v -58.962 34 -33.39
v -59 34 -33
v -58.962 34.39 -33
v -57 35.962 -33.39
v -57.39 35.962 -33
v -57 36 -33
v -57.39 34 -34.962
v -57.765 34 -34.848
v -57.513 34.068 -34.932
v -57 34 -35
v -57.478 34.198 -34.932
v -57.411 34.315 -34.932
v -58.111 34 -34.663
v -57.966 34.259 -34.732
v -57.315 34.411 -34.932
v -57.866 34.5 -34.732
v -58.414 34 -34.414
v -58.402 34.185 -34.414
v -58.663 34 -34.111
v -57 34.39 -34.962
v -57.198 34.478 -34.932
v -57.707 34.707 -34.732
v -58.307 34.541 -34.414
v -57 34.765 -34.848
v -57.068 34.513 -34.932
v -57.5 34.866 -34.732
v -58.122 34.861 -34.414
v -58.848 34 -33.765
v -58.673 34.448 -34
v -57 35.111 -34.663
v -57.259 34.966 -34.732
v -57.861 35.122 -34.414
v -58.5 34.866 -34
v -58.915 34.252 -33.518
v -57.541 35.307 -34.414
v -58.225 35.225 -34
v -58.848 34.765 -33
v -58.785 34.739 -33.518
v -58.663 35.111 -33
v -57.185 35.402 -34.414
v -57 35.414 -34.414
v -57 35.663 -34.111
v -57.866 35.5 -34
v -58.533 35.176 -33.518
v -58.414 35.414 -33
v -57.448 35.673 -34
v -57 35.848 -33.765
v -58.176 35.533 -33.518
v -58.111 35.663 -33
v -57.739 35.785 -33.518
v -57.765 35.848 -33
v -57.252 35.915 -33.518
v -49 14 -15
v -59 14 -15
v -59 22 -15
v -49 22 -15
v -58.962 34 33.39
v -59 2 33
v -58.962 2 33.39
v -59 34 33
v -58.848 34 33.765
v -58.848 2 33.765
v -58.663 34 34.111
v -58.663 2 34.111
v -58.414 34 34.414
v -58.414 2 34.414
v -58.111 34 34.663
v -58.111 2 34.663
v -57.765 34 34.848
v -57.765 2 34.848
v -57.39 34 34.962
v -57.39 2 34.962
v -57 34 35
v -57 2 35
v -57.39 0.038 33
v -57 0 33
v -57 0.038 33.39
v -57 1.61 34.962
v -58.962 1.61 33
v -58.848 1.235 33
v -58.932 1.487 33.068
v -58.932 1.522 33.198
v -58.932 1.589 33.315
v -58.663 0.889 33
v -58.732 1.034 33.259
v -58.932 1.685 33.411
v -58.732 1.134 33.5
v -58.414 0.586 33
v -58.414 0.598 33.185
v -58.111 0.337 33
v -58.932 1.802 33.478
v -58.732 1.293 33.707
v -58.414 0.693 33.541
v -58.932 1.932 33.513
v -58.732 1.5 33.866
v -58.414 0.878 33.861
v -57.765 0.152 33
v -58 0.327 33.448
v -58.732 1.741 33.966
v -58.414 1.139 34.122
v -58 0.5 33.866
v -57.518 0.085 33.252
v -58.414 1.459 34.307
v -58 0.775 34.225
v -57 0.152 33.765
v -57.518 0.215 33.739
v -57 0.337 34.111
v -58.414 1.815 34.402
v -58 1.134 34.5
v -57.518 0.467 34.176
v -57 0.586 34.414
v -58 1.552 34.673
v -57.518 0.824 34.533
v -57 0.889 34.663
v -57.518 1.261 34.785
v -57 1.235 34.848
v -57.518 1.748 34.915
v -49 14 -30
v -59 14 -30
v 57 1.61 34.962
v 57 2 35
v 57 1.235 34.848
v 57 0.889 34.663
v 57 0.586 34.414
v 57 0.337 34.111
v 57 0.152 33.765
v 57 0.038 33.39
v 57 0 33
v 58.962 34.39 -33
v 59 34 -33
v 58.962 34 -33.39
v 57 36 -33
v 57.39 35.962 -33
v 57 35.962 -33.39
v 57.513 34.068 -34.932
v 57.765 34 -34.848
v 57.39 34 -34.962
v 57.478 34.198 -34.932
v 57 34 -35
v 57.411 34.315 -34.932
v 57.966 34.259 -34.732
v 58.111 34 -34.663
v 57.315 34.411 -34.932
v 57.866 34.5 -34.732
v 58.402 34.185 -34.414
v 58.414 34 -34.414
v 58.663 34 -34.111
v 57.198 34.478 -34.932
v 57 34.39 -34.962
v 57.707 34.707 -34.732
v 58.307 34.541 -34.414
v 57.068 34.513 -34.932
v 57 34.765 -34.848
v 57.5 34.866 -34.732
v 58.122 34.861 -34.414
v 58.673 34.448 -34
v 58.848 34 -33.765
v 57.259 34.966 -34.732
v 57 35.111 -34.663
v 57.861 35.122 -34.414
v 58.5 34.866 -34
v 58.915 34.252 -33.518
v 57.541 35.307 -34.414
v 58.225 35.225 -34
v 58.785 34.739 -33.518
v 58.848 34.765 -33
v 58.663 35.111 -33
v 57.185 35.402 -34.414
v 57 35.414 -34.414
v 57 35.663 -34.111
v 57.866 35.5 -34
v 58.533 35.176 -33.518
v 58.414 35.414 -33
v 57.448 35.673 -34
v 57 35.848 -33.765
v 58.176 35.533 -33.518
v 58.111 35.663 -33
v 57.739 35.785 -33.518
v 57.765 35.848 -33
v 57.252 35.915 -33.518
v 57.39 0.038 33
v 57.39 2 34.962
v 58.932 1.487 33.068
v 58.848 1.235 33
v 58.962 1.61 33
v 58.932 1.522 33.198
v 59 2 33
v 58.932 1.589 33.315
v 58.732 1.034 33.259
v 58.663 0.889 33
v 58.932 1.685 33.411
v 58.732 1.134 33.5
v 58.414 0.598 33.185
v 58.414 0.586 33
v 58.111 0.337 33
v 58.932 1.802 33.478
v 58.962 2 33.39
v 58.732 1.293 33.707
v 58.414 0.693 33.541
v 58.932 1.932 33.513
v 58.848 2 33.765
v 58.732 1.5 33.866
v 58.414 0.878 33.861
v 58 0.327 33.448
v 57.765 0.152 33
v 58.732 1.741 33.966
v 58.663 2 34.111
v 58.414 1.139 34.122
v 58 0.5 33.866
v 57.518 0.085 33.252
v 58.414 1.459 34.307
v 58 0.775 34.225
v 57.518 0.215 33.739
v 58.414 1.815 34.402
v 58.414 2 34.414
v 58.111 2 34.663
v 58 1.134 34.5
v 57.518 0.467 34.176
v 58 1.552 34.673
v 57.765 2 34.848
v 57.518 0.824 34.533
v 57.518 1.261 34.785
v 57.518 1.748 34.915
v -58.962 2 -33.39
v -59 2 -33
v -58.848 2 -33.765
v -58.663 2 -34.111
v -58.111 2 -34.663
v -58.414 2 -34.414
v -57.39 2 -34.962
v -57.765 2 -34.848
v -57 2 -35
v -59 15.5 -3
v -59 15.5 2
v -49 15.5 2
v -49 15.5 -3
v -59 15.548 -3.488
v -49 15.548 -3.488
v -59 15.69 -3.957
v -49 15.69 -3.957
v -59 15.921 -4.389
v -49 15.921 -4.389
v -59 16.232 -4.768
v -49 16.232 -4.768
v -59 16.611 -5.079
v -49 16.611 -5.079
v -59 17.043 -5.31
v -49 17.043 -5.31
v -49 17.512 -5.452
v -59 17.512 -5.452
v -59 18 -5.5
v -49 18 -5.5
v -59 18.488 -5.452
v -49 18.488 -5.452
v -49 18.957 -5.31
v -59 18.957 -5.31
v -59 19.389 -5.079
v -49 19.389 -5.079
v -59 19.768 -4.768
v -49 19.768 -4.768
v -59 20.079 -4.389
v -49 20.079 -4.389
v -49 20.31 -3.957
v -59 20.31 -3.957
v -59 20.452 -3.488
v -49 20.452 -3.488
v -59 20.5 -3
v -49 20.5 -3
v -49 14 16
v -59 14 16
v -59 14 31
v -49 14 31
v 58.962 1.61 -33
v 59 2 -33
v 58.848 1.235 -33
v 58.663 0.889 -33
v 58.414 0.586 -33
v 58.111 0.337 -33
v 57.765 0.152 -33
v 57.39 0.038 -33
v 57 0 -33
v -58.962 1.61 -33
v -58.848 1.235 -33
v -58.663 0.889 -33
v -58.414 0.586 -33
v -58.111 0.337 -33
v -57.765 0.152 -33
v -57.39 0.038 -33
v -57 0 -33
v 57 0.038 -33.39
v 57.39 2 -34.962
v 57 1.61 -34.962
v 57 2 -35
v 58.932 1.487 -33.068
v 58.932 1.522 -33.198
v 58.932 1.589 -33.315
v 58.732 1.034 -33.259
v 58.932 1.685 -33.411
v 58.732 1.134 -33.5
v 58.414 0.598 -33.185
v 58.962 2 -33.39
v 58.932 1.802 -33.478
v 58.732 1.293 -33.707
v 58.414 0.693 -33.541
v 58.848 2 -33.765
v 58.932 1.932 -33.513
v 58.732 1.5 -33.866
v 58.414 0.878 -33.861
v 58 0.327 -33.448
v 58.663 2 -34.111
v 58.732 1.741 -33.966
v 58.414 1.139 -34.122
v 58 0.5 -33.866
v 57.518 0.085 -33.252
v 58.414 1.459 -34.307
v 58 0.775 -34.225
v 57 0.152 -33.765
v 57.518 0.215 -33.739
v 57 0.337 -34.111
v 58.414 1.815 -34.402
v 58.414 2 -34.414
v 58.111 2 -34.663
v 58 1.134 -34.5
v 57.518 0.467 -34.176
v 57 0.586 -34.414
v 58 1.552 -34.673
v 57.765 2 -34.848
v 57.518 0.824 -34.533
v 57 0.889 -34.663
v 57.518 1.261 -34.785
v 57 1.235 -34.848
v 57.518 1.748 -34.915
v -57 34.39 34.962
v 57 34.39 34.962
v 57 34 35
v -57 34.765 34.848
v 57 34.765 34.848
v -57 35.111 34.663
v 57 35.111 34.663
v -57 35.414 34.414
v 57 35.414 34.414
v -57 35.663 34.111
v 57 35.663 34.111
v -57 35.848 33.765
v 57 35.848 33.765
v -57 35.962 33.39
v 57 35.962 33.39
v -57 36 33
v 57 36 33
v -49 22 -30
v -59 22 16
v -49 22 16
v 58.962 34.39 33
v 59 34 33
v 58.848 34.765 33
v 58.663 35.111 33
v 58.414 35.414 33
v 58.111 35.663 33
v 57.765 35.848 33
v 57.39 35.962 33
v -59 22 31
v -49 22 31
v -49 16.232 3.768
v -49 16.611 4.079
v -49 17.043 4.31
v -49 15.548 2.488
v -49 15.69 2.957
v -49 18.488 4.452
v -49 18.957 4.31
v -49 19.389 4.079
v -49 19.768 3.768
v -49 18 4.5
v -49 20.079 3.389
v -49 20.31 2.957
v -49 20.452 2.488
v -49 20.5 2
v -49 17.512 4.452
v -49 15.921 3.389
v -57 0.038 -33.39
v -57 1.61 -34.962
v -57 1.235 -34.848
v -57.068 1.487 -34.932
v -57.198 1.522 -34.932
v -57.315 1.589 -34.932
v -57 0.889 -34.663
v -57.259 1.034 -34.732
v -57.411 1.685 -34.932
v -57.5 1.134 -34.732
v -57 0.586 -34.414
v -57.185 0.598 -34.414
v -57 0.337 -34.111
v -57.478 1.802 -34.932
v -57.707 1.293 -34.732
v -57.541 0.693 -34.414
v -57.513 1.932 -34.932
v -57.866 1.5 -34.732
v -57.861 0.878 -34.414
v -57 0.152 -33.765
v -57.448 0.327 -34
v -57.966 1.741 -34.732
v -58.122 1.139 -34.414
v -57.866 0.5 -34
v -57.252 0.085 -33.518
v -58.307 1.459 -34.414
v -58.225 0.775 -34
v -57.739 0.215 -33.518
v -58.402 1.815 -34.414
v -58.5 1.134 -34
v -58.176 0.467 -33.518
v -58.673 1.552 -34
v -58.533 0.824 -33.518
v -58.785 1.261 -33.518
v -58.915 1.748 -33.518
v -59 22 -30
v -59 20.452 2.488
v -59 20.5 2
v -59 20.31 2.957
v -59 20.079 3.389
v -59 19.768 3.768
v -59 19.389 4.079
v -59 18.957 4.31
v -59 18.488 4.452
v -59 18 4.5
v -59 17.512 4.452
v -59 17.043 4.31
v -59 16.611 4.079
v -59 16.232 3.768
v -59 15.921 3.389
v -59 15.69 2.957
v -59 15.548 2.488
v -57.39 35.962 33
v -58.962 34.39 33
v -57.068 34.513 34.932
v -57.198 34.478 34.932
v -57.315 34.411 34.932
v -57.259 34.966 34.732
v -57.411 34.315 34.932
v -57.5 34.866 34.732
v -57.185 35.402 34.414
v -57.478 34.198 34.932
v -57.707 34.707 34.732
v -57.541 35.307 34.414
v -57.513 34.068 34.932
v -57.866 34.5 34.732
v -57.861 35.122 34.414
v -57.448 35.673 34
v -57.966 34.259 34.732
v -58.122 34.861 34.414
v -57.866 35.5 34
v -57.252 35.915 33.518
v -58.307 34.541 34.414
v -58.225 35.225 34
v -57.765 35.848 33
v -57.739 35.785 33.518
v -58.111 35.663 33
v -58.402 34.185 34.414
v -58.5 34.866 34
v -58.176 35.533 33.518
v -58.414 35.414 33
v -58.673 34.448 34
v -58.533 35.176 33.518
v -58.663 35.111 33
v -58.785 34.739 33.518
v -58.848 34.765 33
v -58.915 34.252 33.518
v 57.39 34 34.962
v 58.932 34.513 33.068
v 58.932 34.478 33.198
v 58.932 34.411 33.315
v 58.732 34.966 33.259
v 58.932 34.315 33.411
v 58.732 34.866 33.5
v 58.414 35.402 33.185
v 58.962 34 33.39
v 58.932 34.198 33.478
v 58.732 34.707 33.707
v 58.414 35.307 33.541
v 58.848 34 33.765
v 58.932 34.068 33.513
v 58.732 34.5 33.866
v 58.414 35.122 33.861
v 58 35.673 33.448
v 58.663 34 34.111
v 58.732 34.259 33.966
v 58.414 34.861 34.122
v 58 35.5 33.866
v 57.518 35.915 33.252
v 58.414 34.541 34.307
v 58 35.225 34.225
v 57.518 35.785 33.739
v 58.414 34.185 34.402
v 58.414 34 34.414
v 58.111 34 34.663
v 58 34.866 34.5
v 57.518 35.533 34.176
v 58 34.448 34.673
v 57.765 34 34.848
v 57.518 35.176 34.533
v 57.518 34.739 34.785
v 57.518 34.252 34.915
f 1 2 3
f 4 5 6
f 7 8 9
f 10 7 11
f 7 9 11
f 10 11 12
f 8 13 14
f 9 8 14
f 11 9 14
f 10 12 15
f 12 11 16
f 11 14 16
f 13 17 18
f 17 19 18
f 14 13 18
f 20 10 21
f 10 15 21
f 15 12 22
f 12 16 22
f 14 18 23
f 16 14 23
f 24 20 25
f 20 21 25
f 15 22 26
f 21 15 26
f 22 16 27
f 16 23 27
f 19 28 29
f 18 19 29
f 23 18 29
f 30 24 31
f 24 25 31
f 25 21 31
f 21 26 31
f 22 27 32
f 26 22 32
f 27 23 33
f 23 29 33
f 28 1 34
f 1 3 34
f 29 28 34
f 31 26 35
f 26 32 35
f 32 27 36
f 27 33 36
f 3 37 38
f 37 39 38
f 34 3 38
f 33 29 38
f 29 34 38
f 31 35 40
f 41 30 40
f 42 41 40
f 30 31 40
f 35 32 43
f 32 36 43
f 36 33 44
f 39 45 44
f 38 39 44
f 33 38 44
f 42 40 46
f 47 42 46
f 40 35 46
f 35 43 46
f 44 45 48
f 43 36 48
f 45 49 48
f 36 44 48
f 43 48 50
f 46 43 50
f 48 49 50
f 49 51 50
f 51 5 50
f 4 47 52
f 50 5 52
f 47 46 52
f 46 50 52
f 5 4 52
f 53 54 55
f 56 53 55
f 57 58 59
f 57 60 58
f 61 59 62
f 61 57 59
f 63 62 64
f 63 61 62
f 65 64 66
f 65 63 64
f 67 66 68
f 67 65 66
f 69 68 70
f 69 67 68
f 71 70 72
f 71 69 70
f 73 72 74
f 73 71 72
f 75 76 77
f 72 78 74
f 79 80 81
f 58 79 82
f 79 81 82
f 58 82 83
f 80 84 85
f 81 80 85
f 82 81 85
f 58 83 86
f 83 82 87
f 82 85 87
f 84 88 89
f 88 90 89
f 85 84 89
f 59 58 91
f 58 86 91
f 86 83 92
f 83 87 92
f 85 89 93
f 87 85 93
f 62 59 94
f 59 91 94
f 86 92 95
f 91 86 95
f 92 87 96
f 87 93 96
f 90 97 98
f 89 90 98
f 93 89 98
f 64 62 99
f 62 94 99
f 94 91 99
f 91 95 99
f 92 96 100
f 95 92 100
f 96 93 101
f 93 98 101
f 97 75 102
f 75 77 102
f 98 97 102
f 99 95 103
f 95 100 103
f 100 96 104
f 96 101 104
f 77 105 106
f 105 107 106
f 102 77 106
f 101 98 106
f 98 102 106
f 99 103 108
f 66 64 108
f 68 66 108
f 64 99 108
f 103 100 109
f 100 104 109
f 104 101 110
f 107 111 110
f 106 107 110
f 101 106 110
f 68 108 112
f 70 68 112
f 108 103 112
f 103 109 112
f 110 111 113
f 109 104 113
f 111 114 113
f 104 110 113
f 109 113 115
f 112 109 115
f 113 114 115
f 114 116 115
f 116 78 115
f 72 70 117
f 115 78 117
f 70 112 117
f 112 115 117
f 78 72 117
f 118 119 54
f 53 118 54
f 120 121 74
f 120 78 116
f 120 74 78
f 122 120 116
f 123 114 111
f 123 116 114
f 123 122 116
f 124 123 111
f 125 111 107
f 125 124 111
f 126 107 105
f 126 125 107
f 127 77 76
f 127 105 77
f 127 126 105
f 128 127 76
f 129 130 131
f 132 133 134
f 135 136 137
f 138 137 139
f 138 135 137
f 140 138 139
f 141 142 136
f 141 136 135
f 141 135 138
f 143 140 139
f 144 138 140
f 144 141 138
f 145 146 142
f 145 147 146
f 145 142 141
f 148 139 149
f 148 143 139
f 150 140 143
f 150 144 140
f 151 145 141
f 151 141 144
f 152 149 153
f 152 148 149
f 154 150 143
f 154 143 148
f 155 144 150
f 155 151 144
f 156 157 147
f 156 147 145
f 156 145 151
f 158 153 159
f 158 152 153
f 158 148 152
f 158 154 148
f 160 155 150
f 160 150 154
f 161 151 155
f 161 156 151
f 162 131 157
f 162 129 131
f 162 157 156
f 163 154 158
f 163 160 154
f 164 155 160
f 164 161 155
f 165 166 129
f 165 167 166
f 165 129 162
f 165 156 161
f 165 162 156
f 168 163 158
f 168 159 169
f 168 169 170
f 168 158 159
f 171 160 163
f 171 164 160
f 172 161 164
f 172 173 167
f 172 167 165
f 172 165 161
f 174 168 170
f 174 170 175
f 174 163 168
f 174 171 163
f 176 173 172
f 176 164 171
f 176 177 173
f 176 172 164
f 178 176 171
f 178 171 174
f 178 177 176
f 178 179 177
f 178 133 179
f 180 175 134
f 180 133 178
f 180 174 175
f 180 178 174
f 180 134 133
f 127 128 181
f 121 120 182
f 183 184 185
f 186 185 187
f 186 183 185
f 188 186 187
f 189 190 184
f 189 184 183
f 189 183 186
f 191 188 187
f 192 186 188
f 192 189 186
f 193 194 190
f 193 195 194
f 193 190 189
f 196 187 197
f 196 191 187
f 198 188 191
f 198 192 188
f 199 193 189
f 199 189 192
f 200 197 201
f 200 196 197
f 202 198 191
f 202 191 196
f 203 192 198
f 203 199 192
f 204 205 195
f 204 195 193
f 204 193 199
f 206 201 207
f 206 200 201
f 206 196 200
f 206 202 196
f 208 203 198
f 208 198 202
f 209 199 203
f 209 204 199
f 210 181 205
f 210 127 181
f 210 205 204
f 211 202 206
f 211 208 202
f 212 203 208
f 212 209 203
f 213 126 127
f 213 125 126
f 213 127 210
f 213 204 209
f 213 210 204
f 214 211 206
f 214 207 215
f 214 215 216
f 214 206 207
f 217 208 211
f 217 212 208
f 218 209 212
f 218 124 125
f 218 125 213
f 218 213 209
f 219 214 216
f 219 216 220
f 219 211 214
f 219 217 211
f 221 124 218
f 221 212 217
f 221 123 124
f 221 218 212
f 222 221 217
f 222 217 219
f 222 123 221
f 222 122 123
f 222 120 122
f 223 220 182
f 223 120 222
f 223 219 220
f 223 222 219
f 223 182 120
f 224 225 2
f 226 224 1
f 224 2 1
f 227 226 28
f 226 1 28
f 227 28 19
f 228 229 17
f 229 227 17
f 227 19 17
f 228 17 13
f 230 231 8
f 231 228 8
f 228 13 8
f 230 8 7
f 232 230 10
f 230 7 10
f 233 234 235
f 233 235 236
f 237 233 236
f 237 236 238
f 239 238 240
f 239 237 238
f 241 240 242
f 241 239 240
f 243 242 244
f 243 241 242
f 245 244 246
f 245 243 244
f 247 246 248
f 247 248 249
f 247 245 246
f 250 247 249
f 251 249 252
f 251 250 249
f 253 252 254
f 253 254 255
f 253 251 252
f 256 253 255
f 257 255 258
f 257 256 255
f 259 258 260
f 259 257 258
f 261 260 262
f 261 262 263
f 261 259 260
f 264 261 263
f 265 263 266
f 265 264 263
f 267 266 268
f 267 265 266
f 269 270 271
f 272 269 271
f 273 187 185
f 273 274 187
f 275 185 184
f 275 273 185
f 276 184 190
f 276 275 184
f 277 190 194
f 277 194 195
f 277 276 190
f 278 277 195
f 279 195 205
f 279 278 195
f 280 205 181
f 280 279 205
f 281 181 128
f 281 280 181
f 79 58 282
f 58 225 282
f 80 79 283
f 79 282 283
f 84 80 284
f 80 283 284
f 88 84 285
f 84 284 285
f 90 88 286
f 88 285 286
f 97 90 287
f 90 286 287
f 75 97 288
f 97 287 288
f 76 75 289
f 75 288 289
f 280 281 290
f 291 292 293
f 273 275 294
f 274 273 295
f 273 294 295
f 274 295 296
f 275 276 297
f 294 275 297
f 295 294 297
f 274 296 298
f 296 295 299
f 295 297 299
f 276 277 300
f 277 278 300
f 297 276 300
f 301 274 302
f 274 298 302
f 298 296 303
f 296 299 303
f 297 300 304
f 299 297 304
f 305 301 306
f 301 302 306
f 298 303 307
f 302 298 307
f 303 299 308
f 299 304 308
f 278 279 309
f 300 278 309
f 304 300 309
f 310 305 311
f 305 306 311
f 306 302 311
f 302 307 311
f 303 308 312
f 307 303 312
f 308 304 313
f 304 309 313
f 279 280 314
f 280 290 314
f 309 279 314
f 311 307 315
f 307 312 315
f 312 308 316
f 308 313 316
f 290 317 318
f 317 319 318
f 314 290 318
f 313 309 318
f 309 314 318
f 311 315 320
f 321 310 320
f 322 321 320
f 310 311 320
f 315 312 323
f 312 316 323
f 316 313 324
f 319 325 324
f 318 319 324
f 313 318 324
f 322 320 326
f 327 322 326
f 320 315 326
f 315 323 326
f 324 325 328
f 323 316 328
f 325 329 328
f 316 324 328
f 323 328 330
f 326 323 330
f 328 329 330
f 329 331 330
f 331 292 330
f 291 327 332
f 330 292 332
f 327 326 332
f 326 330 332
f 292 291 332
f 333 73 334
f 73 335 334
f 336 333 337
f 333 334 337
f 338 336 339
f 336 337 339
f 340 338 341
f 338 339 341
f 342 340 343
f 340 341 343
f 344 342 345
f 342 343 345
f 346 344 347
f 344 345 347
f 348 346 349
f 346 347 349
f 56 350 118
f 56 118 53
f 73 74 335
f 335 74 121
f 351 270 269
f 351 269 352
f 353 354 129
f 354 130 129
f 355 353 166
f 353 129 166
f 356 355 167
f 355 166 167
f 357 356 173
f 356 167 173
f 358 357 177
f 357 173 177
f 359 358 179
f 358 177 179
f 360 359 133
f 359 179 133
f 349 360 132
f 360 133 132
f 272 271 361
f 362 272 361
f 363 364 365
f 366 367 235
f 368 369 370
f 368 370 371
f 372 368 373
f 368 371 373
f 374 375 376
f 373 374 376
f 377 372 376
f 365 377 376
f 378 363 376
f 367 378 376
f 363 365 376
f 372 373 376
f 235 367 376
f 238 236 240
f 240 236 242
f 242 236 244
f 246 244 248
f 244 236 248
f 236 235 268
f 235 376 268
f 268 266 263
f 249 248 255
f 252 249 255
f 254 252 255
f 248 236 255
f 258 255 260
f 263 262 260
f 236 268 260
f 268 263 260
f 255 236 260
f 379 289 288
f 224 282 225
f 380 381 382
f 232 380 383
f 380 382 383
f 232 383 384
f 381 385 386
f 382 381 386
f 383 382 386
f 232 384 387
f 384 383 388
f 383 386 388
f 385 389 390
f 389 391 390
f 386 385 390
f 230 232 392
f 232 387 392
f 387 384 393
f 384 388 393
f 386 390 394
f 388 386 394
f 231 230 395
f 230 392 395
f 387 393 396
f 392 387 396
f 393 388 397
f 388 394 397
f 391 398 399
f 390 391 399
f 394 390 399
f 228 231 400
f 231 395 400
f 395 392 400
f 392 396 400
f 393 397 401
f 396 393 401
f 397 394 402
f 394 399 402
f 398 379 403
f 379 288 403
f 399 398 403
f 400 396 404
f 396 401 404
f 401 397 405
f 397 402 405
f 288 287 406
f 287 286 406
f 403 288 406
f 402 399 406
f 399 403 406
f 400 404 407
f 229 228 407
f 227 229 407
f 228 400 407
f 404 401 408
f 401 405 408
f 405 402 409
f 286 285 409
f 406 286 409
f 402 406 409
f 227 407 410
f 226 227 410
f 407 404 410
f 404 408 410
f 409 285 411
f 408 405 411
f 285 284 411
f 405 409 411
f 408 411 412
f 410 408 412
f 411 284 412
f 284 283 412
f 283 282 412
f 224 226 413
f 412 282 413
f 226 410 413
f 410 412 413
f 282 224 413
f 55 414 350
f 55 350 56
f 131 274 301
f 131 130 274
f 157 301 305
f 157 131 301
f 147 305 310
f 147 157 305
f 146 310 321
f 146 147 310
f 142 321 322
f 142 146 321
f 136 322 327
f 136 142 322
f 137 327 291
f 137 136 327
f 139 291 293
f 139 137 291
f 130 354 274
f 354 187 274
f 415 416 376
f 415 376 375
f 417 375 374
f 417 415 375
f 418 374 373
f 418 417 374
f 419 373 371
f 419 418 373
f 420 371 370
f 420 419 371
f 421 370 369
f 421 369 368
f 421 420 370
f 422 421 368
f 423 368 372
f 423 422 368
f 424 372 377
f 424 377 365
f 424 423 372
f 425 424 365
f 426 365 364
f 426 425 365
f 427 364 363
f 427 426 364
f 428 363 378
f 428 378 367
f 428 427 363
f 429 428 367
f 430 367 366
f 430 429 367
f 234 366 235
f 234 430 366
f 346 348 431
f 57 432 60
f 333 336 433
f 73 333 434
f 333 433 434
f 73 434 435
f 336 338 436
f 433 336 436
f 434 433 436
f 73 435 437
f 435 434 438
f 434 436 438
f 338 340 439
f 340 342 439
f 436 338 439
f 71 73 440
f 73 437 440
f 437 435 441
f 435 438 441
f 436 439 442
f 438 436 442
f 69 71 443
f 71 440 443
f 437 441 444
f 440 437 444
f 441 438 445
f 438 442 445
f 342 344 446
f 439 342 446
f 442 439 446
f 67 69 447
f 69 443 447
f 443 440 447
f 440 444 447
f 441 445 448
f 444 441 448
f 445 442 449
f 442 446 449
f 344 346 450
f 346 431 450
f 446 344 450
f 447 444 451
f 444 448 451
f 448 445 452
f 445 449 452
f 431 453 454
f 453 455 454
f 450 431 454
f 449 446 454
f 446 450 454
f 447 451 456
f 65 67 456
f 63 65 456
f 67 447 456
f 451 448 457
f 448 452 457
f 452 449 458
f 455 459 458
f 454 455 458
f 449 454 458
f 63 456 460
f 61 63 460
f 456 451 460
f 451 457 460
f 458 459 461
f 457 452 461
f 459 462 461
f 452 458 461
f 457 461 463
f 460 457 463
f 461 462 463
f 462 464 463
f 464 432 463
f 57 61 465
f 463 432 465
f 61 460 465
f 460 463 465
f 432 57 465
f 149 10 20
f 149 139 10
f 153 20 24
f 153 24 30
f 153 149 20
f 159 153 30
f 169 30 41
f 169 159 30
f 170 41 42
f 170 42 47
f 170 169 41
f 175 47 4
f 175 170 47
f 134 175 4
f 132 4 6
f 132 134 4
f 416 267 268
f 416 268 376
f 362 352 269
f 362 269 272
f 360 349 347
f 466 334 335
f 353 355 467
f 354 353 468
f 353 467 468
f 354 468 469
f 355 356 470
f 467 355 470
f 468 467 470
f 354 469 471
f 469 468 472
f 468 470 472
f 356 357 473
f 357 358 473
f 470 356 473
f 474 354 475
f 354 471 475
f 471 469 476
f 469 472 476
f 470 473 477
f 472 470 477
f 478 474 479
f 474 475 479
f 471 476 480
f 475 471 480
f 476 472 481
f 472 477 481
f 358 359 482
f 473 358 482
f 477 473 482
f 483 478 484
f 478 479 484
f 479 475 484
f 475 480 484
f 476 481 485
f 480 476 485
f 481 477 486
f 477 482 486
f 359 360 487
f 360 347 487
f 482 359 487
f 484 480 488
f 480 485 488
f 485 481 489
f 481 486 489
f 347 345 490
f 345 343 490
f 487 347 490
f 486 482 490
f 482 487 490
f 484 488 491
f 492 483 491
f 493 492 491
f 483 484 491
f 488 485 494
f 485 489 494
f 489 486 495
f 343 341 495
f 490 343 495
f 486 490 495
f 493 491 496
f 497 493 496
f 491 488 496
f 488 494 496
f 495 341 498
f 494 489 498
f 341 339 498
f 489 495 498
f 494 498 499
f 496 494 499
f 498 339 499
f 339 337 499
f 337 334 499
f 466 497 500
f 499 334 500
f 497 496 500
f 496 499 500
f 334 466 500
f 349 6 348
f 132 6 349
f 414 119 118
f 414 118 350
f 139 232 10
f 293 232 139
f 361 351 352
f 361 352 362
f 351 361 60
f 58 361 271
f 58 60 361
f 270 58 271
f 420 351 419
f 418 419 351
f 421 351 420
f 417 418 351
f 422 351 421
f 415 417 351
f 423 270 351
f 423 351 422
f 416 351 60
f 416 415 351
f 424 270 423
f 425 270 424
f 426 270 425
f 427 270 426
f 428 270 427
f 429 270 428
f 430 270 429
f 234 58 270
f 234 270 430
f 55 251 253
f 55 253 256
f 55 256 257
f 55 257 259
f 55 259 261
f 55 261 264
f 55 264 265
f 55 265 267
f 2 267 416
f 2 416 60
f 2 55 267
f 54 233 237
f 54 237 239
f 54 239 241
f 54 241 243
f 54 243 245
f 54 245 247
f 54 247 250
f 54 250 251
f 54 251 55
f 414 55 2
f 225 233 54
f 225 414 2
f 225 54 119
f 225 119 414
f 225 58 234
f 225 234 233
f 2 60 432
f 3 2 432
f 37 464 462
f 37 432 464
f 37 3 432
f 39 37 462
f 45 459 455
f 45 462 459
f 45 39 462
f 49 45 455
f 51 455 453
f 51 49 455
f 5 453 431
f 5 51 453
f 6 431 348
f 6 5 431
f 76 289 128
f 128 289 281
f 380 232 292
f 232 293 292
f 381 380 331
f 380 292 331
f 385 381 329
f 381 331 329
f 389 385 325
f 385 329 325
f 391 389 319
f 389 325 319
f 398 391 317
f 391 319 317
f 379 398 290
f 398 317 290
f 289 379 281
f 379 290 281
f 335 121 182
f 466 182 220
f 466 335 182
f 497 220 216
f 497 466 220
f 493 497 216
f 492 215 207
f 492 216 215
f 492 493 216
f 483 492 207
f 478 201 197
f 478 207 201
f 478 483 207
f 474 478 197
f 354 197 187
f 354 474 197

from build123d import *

# Parameters (mm, degrees)
SKETCH1_W           = 118
SKETCH1_H           = 70
BOSS_EXTRUDE1_DEPTH = 36
FILLET1_R           = 2
SKETCH2_W           = 15
SKETCH2_H           = 8
CUT_EXTRUDE1_DEPTH  = 10


with BuildPart() as part:
    # Sketch1 → Boss-Extrude1 (new body)
    with BuildSketch(Plane(origin=(0, 0, 0), x_dir=(1, 0, 0), z_dir=(0, 1, 0))):
        Rectangle(SKETCH1_W, SKETCH1_H)
    extrude(amount=BOSS_EXTRUDE1_DEPTH)

    # Fillet1
    fillet1_edges = [part.edges().sort_by_distance(p)[0] for p in [
        (-59, 36, 0),
        (0, 36, 35),
        (59, 36, 0),
        (0, 0, 35),
        (-59, 0, 0),
        (0, 0, -35),
        (59, 0, 0),
        (59, 18, 35),
        (-59, 18, 35),
        (-59, 18, -35),
        (59, 18, -35),
        (0, 36, -35),
    ]]
    fillet(fillet1_edges, radius=FILLET1_R)

    # Sketch2 → Cut-Extrude1 (cut)
    with BuildSketch(Plane.ZY.offset(59)):
        with Locations((-22.5, 18)):
            Rectangle(SKETCH2_W, SKETCH2_H)
        with Locations((23.5, 18)):
            Rectangle(SKETCH2_W, SKETCH2_H)
        with BuildLine():
            Line((-3, 20.5), (2, 20.5))
            ThreePointArc((2, 20.5), (4.5, 18), (2, 15.5))
            Line((2, 15.5), (-3, 15.5))
            ThreePointArc((-3, 15.5), (-5.5, 18), (-3, 20.5))
        make_face()
    extrude(amount=-CUT_EXTRUDE1_DEPTH, mode=Mode.SUBTRACT)


solid = part.part
